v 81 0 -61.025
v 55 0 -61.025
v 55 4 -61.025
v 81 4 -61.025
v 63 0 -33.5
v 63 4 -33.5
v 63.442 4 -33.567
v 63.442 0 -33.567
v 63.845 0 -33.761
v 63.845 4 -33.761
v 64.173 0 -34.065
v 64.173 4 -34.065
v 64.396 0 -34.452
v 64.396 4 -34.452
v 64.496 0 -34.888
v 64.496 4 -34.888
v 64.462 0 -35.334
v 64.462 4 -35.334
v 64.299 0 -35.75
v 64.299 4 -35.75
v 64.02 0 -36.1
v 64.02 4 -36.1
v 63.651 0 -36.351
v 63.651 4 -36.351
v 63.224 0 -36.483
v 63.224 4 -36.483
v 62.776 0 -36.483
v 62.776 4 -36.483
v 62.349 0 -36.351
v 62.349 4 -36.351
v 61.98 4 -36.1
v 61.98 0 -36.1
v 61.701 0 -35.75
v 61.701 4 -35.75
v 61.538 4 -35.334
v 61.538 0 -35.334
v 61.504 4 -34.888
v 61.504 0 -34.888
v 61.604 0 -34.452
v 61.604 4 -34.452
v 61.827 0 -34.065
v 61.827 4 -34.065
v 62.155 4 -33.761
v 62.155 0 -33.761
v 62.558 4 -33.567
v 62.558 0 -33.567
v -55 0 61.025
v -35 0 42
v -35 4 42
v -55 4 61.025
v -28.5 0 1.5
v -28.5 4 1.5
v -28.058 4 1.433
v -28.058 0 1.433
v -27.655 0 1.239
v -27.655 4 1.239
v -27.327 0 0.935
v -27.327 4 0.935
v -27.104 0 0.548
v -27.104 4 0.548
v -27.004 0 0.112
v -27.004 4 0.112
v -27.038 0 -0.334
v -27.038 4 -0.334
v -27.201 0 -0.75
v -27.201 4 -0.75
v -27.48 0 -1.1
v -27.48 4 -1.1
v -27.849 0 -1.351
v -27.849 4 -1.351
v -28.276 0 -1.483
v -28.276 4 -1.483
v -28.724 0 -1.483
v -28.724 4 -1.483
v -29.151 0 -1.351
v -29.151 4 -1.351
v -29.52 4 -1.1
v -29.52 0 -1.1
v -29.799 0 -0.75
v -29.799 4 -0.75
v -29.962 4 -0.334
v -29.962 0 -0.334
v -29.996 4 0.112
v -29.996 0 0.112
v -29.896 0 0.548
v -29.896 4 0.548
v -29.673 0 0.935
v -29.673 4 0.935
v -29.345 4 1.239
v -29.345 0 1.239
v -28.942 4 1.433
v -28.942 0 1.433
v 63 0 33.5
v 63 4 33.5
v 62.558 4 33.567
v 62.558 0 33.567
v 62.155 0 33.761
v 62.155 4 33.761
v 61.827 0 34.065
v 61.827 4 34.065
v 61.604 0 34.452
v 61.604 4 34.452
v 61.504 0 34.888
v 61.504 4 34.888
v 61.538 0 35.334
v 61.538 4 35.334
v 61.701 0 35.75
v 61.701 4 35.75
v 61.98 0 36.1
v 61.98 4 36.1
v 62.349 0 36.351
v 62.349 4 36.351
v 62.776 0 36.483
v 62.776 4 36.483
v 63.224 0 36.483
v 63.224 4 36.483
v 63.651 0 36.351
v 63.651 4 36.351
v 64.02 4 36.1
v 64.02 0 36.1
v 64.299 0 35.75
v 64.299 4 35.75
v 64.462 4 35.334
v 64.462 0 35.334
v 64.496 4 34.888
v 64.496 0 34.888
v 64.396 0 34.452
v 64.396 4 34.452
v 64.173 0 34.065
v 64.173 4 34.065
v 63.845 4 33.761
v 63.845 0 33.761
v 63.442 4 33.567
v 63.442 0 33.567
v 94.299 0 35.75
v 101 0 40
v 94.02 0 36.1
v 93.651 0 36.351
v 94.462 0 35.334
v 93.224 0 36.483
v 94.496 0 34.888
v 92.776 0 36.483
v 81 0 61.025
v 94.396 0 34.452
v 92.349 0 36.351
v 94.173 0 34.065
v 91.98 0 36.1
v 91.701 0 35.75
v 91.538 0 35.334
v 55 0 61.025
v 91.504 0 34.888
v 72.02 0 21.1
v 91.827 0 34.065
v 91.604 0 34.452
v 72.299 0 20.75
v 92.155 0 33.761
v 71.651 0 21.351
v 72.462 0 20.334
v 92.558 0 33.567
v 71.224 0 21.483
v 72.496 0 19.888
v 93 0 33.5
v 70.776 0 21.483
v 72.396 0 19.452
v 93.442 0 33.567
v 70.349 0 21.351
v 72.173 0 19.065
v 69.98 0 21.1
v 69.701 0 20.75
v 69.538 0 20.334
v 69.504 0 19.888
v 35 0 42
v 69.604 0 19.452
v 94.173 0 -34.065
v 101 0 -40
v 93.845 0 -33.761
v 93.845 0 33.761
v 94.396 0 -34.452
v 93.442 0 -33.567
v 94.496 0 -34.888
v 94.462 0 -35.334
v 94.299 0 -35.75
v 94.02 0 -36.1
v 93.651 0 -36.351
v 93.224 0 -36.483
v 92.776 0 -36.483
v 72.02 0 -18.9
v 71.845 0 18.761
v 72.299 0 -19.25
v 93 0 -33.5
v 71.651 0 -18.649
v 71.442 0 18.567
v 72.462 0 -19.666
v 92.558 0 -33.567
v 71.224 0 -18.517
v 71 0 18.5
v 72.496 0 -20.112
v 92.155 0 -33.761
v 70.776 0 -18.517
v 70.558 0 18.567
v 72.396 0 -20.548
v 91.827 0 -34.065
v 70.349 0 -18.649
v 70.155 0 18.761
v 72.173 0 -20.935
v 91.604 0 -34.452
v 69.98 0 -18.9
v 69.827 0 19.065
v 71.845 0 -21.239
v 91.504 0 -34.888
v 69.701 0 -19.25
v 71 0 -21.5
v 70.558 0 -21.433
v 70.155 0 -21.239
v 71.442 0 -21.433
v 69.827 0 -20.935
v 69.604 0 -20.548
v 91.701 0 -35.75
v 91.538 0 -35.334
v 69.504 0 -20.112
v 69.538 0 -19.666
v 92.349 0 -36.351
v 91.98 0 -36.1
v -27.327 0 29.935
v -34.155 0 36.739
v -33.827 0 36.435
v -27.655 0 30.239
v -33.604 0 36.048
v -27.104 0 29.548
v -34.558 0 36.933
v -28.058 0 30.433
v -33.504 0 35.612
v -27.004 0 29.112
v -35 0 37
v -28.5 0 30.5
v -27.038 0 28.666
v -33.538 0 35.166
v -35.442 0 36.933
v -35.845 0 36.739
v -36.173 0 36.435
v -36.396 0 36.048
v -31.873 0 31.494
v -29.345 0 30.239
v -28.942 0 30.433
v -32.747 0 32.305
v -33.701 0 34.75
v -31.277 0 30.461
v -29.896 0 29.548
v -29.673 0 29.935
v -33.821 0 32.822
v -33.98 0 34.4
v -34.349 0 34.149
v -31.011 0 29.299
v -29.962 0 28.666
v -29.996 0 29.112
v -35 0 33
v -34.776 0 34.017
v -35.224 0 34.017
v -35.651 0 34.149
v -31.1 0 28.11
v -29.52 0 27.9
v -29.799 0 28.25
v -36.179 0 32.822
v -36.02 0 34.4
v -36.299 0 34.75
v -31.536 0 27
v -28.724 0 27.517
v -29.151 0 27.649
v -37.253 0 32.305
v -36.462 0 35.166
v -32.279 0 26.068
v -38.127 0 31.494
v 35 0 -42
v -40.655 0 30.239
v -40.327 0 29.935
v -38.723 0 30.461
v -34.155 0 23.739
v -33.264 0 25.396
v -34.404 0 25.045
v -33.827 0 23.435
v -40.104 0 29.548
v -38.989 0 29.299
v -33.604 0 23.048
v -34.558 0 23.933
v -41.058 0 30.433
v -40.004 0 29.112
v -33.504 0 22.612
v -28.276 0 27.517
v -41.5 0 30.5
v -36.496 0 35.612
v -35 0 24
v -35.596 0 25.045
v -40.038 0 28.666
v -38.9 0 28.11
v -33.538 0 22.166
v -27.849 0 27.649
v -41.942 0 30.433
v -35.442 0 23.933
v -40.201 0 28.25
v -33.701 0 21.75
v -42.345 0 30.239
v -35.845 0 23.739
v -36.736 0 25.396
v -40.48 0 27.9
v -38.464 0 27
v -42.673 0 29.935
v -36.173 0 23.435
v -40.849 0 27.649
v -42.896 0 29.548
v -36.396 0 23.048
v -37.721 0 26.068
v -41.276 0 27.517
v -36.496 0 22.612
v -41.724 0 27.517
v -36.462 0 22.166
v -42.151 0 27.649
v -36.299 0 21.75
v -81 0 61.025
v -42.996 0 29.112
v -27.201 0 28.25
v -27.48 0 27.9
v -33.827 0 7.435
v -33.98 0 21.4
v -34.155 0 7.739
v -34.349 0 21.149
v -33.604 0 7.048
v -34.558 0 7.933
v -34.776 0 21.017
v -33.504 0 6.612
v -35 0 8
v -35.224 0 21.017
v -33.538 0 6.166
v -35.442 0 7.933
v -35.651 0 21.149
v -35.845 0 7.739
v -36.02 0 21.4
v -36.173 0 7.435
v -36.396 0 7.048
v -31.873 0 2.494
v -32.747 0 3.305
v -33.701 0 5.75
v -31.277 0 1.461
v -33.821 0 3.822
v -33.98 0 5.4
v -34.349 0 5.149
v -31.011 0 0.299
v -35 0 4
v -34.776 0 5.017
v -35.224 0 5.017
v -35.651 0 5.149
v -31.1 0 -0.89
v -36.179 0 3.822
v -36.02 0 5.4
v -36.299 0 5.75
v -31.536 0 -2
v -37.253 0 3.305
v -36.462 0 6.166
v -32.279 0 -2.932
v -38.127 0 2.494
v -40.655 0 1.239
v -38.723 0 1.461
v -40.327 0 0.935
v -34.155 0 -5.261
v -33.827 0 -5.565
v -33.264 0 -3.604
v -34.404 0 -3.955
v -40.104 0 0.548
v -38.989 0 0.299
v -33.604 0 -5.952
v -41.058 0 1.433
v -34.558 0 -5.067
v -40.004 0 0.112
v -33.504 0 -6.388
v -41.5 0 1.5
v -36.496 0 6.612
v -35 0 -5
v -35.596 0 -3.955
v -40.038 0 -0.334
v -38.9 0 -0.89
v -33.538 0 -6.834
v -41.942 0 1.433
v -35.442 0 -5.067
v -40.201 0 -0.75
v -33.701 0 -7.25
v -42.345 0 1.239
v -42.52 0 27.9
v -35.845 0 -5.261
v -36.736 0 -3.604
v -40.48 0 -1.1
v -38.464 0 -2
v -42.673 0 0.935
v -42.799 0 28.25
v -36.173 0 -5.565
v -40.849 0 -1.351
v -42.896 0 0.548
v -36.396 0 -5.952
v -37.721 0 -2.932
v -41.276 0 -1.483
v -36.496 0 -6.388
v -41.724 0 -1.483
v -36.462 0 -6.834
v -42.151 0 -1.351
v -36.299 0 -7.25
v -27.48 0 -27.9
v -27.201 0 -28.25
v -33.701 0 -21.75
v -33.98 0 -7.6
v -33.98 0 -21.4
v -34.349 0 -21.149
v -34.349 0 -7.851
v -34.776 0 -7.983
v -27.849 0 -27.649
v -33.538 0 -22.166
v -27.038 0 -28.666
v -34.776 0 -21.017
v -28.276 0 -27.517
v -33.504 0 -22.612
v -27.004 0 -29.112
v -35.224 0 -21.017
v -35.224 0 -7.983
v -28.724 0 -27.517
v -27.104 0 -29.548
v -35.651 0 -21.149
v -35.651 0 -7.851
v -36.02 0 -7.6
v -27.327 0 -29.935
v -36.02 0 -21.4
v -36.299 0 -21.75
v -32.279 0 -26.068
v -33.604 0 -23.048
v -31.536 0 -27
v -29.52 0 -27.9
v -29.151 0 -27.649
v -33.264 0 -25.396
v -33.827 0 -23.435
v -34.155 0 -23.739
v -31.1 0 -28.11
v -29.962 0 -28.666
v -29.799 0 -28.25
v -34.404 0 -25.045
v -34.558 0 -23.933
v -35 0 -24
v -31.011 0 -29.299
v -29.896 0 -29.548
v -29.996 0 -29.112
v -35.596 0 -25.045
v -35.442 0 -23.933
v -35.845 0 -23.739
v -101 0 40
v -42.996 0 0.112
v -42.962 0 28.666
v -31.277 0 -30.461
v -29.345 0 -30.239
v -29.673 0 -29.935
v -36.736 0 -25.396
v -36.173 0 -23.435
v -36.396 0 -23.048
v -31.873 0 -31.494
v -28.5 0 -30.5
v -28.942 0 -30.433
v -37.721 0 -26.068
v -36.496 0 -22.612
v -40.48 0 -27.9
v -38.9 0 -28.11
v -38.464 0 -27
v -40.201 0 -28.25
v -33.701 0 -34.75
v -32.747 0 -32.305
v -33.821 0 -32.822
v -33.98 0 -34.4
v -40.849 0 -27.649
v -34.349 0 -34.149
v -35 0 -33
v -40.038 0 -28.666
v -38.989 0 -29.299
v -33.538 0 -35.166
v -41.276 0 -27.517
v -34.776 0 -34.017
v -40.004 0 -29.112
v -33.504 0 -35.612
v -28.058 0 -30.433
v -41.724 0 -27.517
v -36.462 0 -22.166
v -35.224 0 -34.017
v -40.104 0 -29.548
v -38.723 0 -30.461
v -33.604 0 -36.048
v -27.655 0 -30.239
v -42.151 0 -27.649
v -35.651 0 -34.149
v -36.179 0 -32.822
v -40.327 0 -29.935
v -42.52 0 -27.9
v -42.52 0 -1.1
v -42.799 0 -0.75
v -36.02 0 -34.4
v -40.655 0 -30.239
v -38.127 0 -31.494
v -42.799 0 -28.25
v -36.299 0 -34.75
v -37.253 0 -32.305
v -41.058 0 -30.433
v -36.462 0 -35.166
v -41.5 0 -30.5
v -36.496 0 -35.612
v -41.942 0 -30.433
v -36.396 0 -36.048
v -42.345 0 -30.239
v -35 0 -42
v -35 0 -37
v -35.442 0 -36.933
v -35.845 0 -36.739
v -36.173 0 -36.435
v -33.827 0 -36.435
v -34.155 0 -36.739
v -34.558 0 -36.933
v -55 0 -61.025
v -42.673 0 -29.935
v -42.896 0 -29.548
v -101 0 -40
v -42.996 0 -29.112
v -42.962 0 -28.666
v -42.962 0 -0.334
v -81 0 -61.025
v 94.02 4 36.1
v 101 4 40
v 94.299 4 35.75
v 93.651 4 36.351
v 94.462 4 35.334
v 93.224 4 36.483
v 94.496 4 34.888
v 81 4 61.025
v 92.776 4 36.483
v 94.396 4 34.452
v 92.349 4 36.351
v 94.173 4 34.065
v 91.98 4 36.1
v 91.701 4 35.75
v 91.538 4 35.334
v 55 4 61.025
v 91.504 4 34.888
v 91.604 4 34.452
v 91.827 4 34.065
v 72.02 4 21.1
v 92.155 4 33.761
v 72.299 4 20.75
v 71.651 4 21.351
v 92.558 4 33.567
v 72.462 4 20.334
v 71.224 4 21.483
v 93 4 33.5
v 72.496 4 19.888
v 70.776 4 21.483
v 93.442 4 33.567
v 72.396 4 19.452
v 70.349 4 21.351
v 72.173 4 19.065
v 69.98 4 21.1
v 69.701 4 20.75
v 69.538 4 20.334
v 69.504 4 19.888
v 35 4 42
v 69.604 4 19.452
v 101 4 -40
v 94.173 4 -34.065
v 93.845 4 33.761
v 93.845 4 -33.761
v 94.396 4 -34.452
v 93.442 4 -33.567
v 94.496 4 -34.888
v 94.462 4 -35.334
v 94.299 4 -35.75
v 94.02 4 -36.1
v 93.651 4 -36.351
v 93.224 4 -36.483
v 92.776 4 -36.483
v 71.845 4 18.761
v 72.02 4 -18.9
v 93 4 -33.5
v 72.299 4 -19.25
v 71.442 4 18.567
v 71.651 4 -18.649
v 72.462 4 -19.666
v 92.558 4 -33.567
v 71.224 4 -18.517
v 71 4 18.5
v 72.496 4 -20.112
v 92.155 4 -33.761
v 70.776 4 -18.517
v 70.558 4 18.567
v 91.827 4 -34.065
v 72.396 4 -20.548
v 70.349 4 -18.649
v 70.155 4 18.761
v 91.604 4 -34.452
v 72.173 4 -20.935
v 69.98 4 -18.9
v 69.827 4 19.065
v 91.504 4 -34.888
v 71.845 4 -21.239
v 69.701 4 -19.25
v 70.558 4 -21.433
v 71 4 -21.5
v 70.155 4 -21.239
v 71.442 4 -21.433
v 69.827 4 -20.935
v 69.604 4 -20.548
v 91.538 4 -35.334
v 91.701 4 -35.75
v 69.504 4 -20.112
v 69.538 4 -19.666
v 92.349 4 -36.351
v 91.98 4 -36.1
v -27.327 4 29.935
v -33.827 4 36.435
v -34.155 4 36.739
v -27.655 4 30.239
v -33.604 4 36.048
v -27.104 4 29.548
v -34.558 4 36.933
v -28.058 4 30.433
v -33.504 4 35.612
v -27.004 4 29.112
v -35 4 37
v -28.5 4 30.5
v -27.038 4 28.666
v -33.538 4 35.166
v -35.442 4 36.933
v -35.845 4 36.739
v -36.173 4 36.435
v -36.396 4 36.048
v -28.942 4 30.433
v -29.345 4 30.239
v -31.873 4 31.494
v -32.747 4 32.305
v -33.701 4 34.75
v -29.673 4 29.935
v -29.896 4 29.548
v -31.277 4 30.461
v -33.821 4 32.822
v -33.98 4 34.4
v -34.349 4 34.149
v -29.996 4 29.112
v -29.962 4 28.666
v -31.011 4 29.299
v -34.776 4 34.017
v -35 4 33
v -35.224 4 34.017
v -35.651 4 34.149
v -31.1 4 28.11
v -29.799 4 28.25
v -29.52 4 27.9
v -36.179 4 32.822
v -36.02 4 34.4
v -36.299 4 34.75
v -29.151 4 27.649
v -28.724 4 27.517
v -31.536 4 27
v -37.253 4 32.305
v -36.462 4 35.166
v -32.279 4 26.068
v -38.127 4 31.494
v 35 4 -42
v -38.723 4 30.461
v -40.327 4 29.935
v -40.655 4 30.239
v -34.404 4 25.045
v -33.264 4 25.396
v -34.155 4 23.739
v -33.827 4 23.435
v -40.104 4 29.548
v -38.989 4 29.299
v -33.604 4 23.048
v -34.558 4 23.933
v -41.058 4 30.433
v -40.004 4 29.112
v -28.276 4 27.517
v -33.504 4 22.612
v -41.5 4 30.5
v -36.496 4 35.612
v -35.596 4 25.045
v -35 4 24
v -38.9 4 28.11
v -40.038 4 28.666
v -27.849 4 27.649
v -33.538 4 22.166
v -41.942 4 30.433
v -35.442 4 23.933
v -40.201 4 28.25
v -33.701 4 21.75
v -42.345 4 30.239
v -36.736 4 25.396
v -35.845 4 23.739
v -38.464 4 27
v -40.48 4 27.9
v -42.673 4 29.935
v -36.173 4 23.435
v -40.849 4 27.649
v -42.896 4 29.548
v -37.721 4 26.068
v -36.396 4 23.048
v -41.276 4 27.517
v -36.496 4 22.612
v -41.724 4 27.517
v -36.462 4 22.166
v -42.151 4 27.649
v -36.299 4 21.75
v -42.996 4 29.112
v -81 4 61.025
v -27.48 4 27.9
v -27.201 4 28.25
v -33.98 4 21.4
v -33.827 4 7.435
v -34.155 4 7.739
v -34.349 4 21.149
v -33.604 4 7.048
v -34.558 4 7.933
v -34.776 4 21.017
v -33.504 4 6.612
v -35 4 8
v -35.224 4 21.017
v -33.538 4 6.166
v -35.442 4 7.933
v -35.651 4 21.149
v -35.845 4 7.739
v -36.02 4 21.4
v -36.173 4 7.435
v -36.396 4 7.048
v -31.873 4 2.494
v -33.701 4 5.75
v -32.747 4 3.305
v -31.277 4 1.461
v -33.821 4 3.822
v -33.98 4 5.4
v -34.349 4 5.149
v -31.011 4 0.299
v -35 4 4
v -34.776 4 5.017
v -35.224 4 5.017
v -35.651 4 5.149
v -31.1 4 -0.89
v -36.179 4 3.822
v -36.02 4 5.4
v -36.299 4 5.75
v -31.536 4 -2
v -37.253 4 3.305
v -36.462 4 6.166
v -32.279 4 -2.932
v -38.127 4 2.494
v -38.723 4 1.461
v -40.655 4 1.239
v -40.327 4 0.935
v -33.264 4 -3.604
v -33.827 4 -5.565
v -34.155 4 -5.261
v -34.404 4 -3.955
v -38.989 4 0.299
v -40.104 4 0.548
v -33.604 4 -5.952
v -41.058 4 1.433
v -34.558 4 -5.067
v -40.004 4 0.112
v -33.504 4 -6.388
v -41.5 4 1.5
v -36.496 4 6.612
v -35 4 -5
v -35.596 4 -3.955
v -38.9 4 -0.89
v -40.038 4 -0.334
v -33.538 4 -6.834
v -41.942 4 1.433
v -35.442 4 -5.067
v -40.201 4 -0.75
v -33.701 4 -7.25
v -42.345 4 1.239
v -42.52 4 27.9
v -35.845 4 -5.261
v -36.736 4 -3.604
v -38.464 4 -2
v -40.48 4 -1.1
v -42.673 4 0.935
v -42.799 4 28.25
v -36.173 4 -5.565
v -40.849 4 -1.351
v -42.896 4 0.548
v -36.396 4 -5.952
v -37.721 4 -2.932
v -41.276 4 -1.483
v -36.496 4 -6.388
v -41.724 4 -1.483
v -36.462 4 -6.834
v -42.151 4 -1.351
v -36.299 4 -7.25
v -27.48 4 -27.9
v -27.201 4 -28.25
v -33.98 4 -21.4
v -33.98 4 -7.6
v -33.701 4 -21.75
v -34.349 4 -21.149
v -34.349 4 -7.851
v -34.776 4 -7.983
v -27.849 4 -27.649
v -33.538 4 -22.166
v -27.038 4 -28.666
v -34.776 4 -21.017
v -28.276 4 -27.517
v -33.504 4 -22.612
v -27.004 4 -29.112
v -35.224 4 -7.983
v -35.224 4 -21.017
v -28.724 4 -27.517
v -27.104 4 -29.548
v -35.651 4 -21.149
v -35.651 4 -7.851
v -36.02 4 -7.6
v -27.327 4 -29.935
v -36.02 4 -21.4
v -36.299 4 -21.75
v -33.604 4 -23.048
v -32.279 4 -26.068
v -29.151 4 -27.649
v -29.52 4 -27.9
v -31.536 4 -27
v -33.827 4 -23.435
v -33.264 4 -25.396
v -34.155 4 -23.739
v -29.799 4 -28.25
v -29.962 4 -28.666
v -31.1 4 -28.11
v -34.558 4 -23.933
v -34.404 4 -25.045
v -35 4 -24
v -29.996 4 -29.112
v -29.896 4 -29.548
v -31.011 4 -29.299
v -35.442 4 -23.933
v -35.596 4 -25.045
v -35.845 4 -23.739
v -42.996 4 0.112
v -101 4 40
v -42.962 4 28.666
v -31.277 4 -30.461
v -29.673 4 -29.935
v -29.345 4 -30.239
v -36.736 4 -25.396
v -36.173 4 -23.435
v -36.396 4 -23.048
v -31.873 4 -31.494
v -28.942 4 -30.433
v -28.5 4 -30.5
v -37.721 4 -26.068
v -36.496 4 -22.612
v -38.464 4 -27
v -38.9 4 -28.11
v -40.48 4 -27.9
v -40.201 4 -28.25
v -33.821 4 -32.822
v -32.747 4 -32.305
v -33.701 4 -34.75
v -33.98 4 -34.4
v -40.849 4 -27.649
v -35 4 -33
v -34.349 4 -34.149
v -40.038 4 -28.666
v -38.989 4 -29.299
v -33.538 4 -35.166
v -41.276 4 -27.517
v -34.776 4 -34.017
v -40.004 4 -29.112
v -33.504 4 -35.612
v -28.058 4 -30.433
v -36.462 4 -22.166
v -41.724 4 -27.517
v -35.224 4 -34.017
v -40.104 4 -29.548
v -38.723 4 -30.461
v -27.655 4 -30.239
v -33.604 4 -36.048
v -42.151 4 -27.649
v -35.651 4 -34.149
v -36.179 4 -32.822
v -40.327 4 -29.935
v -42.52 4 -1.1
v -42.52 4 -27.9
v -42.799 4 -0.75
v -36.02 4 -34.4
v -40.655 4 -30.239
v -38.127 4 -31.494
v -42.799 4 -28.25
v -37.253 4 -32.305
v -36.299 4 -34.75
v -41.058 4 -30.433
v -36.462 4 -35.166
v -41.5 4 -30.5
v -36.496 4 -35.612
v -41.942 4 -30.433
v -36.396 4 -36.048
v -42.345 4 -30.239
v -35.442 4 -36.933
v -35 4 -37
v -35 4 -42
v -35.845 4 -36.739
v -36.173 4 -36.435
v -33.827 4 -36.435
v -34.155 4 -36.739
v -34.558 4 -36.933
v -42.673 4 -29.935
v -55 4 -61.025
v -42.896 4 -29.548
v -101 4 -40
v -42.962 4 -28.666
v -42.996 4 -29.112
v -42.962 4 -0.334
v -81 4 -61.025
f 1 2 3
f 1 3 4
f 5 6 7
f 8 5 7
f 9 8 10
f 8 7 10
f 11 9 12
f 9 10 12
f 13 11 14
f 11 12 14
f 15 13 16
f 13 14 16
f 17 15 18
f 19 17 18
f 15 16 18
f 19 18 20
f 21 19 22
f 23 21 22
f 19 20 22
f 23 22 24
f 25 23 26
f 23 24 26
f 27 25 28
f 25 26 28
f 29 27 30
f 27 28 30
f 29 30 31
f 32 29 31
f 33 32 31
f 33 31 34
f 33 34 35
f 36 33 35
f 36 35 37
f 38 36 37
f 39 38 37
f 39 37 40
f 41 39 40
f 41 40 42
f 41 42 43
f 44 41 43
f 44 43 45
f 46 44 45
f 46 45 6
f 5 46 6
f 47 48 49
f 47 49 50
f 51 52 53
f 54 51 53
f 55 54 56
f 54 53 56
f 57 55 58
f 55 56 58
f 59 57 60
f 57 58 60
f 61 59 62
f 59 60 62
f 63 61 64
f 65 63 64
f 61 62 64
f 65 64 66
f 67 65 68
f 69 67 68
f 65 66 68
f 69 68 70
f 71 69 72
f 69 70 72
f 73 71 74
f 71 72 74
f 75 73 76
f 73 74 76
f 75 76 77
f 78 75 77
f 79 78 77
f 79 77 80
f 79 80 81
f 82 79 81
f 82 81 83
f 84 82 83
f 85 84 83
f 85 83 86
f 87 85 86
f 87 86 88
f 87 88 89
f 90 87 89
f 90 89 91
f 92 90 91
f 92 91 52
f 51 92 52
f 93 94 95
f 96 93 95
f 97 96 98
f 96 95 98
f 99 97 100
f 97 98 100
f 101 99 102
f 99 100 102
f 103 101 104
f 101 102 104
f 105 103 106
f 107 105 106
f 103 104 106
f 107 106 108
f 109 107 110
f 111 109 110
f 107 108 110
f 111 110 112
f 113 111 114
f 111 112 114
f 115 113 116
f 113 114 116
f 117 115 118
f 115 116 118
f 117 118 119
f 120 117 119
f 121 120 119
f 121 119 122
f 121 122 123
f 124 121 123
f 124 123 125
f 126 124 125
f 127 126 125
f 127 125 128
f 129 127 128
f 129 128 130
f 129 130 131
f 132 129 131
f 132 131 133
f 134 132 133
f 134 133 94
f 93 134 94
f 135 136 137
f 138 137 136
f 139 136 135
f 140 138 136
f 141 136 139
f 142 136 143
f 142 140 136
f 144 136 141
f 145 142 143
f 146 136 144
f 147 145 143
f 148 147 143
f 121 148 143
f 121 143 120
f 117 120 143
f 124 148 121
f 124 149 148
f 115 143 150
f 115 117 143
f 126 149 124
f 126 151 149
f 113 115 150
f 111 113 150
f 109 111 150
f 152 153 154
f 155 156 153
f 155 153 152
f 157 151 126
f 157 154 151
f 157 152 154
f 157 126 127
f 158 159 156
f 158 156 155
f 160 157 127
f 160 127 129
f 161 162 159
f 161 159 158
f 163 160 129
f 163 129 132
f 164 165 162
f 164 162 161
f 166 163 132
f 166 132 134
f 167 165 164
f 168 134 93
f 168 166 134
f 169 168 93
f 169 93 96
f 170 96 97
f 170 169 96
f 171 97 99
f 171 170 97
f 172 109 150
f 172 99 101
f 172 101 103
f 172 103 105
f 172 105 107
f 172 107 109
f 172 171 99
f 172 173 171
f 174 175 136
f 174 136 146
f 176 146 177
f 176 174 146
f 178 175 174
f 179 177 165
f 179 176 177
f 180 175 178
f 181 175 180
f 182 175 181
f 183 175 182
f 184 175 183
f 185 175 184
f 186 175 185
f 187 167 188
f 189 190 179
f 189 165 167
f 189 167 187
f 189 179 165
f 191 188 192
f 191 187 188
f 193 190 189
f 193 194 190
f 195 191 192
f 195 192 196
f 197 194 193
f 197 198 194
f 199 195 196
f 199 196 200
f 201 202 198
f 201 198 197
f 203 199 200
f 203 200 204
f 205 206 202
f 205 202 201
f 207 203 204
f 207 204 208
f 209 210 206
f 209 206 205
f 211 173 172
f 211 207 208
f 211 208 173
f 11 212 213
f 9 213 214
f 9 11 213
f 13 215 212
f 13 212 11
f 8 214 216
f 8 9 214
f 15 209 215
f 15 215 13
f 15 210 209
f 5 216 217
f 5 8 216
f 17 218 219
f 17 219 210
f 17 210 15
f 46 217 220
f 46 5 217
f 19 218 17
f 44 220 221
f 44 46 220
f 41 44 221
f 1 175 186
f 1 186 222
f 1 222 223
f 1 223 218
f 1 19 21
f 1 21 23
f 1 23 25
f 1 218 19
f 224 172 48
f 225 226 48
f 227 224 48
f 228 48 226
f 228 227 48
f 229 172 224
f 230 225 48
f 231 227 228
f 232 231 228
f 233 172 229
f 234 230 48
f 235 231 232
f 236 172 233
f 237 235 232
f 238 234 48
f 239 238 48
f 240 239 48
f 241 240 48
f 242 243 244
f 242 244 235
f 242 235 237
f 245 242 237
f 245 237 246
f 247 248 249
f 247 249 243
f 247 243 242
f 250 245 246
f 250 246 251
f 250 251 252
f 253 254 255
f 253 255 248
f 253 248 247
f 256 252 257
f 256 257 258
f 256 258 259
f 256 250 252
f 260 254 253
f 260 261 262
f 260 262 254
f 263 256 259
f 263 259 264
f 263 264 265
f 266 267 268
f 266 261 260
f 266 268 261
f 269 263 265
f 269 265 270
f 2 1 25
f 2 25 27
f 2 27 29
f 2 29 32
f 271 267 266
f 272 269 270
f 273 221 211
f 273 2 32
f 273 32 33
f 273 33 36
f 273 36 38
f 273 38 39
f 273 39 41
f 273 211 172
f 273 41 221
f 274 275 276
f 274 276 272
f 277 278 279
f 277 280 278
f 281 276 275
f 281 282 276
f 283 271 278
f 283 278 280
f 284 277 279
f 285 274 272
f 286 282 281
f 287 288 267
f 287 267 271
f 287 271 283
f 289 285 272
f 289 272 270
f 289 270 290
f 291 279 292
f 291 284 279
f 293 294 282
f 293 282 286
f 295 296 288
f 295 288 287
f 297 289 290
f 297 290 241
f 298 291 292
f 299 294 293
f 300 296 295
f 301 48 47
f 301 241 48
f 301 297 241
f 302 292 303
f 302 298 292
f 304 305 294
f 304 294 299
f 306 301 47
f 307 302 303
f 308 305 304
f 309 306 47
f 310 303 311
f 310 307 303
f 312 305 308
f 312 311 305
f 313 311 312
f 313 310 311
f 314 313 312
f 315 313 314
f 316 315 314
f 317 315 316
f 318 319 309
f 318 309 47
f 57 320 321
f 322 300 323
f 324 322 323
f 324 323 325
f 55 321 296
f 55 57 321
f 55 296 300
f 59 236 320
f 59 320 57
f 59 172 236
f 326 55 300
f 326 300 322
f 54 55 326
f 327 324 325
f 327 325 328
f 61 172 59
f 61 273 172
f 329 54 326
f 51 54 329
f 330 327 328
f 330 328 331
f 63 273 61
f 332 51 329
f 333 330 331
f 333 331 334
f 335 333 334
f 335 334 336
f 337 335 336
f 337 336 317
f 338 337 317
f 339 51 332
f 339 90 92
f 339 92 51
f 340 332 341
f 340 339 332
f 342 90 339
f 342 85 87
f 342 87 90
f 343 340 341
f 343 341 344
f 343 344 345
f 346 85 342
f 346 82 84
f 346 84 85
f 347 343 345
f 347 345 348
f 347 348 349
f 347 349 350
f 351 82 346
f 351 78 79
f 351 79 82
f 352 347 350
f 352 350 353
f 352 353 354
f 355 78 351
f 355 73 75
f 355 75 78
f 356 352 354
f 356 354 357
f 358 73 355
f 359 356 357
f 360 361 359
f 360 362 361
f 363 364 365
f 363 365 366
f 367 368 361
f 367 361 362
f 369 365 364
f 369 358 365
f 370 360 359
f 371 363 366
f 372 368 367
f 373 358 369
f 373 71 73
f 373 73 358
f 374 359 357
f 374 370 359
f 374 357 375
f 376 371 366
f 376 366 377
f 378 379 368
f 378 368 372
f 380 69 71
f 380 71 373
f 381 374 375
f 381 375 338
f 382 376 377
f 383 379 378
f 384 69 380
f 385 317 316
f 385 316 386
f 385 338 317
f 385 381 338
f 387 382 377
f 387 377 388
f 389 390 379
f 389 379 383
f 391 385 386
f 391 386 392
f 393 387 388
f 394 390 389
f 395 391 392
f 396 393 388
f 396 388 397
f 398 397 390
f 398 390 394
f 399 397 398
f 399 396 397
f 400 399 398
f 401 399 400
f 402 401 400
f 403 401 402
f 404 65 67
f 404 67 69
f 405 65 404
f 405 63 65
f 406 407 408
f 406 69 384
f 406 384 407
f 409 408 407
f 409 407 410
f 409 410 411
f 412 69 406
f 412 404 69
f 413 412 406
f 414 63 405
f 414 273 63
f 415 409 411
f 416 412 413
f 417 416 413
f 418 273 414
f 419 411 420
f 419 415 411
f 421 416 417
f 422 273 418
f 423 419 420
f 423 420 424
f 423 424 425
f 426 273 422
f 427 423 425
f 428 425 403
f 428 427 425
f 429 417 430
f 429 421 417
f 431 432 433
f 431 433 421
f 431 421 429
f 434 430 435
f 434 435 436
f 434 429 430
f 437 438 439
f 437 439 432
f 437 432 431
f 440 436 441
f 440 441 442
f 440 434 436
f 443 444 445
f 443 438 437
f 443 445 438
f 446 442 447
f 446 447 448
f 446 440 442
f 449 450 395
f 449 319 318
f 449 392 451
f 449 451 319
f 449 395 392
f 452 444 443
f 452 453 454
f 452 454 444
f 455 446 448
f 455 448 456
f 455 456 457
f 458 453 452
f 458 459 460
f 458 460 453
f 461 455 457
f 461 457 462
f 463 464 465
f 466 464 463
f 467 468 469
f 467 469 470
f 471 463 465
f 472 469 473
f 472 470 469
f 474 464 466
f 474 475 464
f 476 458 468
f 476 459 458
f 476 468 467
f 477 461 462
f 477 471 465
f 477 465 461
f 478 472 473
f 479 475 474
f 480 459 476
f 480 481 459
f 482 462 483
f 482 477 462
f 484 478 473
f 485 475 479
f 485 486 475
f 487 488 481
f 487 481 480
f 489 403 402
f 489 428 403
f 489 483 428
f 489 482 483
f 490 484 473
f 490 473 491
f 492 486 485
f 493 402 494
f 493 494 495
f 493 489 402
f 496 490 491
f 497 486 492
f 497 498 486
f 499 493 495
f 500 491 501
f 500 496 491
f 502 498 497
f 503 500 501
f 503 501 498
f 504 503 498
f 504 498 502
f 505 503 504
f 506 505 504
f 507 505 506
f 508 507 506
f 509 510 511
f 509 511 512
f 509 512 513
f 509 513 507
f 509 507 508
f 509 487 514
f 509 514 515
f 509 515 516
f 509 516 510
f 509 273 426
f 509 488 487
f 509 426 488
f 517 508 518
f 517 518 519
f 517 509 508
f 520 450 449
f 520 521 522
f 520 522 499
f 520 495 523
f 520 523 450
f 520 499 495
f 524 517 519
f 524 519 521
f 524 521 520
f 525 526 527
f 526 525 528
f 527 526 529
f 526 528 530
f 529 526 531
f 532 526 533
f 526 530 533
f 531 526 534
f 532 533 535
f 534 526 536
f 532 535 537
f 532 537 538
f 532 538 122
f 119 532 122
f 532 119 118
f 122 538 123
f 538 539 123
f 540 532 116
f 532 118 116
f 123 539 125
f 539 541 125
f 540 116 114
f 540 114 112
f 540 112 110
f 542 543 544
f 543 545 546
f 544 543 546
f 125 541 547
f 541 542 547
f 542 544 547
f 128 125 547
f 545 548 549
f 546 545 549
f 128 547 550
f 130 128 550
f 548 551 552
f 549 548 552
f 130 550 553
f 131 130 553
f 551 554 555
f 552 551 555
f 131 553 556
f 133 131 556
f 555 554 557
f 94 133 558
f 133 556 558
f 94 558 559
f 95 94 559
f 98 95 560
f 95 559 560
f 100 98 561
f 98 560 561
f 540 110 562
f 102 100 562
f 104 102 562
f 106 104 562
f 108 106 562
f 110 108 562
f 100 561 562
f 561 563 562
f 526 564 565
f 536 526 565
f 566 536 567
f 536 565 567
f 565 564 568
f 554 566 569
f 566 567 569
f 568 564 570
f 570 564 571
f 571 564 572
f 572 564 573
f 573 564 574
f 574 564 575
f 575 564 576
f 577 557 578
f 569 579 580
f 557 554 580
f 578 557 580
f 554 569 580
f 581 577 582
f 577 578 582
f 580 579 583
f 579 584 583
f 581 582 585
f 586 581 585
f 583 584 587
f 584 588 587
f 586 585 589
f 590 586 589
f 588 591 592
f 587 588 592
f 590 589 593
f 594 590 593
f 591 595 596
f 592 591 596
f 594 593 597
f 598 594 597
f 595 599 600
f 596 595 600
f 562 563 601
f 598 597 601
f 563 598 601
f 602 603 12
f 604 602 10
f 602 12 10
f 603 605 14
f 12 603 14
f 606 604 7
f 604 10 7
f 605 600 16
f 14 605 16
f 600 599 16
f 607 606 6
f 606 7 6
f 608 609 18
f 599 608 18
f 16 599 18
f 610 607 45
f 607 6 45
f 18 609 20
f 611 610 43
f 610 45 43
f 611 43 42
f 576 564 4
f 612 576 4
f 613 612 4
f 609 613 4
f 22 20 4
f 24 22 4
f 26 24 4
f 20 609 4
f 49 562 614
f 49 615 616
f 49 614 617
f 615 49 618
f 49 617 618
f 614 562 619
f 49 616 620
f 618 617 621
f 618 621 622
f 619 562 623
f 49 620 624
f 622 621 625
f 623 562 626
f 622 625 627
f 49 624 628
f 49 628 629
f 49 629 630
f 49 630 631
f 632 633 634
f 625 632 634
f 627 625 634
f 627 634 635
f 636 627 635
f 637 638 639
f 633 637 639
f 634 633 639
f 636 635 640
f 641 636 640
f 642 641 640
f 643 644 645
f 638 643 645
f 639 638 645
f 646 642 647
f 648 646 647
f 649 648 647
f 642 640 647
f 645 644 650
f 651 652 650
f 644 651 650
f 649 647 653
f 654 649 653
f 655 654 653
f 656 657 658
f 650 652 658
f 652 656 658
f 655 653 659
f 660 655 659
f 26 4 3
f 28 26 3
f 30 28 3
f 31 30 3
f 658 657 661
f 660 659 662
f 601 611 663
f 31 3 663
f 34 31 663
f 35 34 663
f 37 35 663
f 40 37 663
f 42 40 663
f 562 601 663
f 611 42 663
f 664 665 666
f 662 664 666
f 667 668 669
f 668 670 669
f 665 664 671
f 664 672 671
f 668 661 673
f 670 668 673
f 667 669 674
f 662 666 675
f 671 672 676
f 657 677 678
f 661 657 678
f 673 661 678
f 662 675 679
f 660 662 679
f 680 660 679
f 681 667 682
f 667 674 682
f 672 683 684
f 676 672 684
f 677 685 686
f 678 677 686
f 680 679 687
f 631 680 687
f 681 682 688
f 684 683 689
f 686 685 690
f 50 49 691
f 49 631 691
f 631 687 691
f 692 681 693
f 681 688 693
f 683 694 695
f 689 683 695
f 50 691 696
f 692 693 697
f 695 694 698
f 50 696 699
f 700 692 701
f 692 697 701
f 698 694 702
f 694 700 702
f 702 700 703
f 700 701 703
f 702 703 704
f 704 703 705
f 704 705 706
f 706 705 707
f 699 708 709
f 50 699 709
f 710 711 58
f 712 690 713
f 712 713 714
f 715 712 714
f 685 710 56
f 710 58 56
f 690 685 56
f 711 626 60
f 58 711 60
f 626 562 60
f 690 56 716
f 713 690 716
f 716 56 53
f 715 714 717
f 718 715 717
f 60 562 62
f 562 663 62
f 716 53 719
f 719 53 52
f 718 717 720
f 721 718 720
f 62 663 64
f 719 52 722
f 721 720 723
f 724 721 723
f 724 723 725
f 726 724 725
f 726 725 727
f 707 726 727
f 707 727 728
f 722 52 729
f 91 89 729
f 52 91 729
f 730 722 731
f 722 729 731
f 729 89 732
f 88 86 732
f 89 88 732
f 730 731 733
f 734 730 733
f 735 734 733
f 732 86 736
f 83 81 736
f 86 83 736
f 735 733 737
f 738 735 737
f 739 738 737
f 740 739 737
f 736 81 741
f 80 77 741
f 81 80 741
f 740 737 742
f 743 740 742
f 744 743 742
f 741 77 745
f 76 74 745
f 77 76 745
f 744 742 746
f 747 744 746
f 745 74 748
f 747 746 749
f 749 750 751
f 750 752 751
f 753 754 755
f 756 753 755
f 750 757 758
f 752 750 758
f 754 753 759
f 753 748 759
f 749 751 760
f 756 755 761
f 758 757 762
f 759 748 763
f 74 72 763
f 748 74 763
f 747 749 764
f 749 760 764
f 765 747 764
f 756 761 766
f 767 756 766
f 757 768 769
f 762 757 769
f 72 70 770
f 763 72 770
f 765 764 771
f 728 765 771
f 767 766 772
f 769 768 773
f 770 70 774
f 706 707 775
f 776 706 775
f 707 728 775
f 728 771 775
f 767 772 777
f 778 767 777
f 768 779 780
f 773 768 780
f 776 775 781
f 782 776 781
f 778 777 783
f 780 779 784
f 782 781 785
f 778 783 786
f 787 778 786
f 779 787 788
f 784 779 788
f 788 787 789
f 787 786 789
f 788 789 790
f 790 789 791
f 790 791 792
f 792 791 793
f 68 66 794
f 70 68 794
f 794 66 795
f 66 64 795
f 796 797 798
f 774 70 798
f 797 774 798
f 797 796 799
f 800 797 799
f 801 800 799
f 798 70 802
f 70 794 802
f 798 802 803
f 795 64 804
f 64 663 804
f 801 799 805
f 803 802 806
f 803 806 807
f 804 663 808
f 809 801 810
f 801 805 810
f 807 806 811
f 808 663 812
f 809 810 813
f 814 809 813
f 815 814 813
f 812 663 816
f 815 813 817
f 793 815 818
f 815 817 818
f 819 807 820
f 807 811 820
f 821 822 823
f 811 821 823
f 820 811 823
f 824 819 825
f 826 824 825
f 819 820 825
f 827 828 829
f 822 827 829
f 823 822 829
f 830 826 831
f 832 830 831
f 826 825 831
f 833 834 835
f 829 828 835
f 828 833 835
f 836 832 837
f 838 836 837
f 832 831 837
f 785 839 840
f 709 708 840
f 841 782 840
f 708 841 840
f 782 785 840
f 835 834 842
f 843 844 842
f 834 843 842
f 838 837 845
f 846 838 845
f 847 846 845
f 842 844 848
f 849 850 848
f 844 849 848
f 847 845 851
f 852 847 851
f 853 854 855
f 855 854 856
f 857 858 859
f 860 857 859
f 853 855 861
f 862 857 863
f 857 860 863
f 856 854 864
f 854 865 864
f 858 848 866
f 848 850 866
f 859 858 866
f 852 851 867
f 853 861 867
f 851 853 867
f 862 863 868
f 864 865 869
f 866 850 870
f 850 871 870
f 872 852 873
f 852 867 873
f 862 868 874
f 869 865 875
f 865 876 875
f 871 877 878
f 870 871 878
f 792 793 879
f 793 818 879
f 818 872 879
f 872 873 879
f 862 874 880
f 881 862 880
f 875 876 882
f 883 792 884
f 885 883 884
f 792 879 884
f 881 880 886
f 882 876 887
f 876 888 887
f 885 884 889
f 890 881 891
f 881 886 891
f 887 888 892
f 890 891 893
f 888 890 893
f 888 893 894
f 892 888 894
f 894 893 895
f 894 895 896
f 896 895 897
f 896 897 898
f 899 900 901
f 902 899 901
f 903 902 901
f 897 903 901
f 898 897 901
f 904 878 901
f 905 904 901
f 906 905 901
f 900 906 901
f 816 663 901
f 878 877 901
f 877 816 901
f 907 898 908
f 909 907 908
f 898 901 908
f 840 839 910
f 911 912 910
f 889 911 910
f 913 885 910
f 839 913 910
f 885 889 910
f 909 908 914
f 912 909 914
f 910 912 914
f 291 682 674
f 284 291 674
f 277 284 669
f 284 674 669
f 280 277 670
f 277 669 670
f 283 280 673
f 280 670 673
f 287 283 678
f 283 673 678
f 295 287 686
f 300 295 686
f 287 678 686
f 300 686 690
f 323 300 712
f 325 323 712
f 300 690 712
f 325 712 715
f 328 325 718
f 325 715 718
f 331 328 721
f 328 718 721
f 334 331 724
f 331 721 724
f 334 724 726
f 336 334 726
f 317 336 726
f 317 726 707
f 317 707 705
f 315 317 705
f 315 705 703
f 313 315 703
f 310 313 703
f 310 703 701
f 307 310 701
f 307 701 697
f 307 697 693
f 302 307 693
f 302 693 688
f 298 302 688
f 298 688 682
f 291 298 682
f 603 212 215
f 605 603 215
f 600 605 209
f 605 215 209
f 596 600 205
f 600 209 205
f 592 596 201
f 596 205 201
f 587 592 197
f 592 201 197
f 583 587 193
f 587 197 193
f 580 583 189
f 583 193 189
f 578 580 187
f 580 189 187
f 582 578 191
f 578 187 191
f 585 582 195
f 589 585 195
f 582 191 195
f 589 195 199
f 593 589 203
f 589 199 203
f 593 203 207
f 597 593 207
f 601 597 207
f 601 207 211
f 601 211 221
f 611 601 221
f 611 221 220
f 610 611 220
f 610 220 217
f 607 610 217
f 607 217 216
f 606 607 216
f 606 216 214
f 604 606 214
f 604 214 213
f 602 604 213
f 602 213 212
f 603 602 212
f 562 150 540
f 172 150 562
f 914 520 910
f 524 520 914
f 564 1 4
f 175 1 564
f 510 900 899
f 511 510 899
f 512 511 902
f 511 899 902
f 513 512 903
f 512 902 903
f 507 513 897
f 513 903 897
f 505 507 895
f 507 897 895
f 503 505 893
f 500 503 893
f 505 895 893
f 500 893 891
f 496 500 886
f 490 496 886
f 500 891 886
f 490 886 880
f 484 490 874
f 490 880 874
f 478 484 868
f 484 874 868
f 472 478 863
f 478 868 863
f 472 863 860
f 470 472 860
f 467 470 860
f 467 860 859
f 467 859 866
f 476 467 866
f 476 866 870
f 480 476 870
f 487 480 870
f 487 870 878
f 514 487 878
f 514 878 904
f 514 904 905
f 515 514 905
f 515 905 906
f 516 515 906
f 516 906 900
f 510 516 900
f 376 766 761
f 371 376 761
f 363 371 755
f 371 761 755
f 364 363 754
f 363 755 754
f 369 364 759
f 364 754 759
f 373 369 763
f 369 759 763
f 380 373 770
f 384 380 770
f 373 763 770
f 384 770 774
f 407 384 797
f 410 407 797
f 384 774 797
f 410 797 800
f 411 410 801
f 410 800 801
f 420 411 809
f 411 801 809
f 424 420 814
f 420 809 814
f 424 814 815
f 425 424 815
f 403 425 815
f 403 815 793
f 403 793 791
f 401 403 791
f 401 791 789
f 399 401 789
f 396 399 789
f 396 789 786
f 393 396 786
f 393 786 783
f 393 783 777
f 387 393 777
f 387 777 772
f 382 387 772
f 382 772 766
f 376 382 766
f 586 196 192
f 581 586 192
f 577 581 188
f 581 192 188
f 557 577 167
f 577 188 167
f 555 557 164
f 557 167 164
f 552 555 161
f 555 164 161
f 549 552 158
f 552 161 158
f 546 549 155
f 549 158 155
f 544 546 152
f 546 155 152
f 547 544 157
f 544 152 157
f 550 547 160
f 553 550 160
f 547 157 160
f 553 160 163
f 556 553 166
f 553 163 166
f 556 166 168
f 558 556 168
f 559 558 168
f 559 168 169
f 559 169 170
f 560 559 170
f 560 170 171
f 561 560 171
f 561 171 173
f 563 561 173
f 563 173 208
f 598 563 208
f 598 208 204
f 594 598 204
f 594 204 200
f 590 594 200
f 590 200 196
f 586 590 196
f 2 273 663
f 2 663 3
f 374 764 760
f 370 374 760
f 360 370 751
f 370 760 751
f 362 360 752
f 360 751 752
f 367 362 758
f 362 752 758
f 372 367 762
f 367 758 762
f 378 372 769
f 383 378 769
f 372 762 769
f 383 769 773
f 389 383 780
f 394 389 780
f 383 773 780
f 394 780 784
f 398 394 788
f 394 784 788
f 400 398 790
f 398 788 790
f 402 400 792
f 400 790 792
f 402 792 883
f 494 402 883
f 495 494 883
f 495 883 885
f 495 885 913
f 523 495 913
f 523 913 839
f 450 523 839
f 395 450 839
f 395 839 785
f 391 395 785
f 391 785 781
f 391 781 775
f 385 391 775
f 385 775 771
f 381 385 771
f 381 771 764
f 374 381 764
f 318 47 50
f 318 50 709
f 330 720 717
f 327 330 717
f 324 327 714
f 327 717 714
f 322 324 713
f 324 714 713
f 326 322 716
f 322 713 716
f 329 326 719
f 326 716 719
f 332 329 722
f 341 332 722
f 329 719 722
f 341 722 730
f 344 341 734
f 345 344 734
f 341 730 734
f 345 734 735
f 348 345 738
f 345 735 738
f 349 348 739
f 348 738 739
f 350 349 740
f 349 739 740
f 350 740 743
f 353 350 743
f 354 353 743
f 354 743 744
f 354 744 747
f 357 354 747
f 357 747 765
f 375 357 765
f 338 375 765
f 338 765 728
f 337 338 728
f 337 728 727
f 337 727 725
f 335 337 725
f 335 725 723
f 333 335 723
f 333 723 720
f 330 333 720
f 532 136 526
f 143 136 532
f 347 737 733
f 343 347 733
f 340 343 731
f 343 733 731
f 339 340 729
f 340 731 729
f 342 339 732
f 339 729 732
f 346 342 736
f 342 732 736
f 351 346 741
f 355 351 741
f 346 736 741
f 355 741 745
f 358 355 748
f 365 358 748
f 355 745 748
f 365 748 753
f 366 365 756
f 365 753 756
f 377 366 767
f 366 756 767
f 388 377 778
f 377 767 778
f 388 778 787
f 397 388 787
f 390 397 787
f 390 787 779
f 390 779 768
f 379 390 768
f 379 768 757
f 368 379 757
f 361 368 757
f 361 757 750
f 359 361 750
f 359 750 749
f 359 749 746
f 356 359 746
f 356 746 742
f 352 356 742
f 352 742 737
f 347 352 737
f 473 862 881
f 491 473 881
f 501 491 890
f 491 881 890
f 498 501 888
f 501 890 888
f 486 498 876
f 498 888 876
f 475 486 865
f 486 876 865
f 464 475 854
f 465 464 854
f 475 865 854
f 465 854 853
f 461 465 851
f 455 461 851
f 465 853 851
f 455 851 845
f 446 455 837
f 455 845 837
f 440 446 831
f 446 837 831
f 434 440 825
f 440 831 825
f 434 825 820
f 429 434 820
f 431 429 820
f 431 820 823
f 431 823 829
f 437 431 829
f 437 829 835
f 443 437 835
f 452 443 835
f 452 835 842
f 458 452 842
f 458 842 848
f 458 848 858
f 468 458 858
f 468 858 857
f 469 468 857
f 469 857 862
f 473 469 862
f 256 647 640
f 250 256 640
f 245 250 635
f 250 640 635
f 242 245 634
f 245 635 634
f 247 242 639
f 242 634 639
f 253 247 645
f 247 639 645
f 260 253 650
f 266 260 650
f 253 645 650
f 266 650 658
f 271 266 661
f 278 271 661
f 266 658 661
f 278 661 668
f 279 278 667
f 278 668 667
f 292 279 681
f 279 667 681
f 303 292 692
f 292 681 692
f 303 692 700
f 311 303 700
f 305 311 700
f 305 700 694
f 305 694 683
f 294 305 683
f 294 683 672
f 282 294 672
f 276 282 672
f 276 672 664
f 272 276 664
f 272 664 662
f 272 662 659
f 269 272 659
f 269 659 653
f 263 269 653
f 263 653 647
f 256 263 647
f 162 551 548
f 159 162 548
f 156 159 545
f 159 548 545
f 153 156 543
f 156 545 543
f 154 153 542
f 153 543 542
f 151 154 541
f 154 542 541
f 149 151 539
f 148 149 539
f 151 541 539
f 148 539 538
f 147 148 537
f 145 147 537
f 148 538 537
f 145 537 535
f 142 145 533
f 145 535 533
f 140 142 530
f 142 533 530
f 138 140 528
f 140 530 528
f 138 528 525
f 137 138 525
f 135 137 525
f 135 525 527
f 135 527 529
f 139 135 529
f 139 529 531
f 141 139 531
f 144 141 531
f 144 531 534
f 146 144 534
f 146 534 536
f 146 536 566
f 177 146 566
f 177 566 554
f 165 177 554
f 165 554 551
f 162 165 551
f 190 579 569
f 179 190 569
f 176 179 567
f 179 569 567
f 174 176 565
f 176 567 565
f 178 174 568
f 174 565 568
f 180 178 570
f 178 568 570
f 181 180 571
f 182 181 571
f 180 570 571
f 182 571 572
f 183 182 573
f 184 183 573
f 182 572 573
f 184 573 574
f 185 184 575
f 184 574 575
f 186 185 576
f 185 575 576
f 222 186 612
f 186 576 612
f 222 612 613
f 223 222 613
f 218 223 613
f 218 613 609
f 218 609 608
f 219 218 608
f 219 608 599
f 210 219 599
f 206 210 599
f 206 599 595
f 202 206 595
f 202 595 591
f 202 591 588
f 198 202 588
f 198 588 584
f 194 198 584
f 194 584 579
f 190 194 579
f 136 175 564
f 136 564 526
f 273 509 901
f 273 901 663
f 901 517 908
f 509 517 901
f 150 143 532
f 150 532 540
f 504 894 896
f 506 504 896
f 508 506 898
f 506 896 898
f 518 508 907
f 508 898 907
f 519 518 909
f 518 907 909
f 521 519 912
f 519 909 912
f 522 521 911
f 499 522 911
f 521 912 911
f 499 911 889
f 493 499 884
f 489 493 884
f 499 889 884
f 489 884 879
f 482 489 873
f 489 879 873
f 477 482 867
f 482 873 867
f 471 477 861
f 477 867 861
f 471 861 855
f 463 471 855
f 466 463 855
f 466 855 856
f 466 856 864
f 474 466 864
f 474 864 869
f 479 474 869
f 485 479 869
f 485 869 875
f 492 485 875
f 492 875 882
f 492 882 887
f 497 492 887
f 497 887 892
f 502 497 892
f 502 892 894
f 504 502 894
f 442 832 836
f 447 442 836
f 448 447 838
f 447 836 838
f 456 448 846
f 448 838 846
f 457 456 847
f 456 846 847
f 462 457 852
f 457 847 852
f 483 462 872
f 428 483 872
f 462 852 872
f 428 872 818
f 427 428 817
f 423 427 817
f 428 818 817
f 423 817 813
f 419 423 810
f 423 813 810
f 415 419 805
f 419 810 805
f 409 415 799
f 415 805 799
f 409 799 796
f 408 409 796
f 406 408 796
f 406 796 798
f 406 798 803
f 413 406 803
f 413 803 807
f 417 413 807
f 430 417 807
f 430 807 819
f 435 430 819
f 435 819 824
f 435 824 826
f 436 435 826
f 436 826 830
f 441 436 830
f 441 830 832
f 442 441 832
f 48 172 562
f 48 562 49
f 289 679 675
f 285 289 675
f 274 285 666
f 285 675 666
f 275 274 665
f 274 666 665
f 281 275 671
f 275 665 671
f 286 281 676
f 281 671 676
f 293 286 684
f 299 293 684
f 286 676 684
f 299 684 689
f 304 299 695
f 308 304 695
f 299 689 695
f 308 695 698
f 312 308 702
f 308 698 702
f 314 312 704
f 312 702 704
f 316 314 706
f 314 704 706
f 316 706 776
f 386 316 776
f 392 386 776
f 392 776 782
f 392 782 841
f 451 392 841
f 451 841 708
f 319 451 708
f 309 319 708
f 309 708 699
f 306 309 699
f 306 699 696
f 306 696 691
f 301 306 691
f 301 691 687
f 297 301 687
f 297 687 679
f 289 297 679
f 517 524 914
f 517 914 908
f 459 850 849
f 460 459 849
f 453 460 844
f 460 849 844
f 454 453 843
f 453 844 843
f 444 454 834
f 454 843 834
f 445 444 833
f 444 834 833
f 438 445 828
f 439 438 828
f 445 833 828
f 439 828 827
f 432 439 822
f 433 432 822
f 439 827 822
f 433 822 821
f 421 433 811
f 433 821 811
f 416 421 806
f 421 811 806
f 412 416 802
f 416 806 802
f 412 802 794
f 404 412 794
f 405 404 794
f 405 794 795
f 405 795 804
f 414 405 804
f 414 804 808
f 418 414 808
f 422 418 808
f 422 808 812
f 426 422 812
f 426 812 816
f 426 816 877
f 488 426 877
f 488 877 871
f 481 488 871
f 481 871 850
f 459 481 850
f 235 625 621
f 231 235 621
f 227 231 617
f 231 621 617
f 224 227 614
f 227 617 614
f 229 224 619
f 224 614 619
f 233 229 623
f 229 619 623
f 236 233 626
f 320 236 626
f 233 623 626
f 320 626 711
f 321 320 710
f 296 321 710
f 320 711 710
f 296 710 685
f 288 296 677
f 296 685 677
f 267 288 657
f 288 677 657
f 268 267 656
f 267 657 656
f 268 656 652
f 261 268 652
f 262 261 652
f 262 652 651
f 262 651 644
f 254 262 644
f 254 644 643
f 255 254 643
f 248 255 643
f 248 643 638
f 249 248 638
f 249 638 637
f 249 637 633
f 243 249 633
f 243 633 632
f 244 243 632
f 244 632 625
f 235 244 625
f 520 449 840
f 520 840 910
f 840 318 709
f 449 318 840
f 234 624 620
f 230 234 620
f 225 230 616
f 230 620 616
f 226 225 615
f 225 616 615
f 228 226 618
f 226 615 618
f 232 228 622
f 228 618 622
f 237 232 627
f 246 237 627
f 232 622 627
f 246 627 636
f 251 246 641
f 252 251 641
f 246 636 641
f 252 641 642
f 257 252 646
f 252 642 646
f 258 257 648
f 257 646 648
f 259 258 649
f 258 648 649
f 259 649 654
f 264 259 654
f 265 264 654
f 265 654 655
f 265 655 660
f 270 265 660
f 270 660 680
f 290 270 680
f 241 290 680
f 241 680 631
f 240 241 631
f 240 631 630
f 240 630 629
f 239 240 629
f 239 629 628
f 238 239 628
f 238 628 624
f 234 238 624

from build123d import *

# Parameters (mm, degrees)
BOSS_EXTRUDE1_DEPTH = 4
SKETCH3_R           = 4
SKETCH3_R_2         = 1.5
CUT_EXTRUDE1_DEPTH  = 119.072218241
SKETCH5_R           = 1.5
CUT_EXTRUDE2_DEPTH  = 119.072218241
SKETCH6_R           = 1.5
CUT_EXTRUDE3_DEPTH  = 119.072218241


with BuildPart() as part:
    # Sketch1 → Boss-Extrude1 (new body)
    with BuildSketch(Plane(origin=(0, 0, 0), x_dir=(1, 0, 0), z_dir=(0, 1, 0))):
        Polygon((-55, 61.024984395), (-35, 42), (35, 42), (55, 61.024984395), (81, 61.024984395), (101, 40), (101, -40), (81, -61.024984395), (55, -61.024984395), (35, -42), (-35, -42), (-55, -61.024984395), (-81, -61.024984395), (-101, -40), (-101, 40), (-81, 61.024984395), align=None)
    extrude(amount=BOSS_EXTRUDE1_DEPTH)

    # Sketch3 → Cut-Extrude1 (cut, through all)
    with BuildSketch(Plane(origin=(0, 4, 0), x_dir=(1, 0, 0), z_dir=(0, 1, 0))):
        with Locations(Location((-35, -29, 0), (0, 0, 270))):
            Circle(SKETCH3_R)
        with Locations(Location((-28.5, -29, 0), (0, 0, 270))):
            Circle(SKETCH3_R_2)
        with Locations(Location((-41.5, -29, 0), (0, 0, 270))):
            Circle(SKETCH3_R_2)
        with Locations(Location((-35, -22.5, 0), (0, 0, 270))):
            Circle(SKETCH3_R_2)
        with Locations(Location((-35, -35.5, 0), (0, 0, 270))):
            Circle(SKETCH3_R_2)
        with Locations(Location((-35, 35.5, 0), (0, 0, 90))):
            Circle(SKETCH3_R_2)
        with Locations(Location((-35, 22.5, 0), (0, 0, 90))):
            Circle(SKETCH3_R_2)
        with Locations(Location((-41.5, 29, 0), (0, 0, 90))):
            Circle(SKETCH3_R_2)
        with Locations(Location((-28.5, 29, 0), (0, 0, 90))):
            Circle(SKETCH3_R_2)
        with Locations(Location((-35, 29, 0), (0, 0, 90))):
            Circle(SKETCH3_R)
        with Locations(Location((-35, 0, 0), (0, 0, 270))):
            Circle(SKETCH3_R)
        with Locations(Location((-35, 6.5, 0), (0, 0, 270))):
            Circle(SKETCH3_R_2)
        with Locations(Location((-28.5, 0, 0), (0, 0, 270))):
            Circle(SKETCH3_R_2)
        with Locations(Location((-41.5, 0, 0), (0, 0, 270))):
            Circle(SKETCH3_R_2)
        with Locations(Location((-35, -6.5, 0), (0, 0, 270))):
            Circle(SKETCH3_R_2)
    extrude(amount=-CUT_EXTRUDE1_DEPTH, mode=Mode.SUBTRACT)

    # Sketch5 → Cut-Extrude2 (cut, through all)
    with BuildSketch(Plane(origin=(0, 4, 0), x_dir=(1, 0, 0), z_dir=(0, 1, 0))):
        with Locations(Location((93, 35, 0), (0, 0, 270))):
            Circle(SKETCH5_R)
        with Locations(Location((63, 35, 0), (0, 0, 270))):
            Circle(SKETCH5_R)
        with Locations(Location((63, -35, 0), (0, 0, 90))):
            Circle(SKETCH5_R)
        with Locations(Location((93, -35, 0), (0, 0, 90))):
            Circle(SKETCH5_R)
    extrude(amount=-CUT_EXTRUDE2_DEPTH, mode=Mode.SUBTRACT)

    # Sketch6 → Cut-Extrude3 (cut, through all)
    with BuildSketch(Plane.XZ):
        with Locations(Location((71, 20, 0), (0, 0, 270))):
            Circle(SKETCH6_R)
        with Locations(Location((71, -20, 0), (0, 0, 270))):
            Circle(SKETCH6_R)
    extrude(amount=-CUT_EXTRUDE3_DEPTH, mode=Mode.SUBTRACT)


solid = part.part
